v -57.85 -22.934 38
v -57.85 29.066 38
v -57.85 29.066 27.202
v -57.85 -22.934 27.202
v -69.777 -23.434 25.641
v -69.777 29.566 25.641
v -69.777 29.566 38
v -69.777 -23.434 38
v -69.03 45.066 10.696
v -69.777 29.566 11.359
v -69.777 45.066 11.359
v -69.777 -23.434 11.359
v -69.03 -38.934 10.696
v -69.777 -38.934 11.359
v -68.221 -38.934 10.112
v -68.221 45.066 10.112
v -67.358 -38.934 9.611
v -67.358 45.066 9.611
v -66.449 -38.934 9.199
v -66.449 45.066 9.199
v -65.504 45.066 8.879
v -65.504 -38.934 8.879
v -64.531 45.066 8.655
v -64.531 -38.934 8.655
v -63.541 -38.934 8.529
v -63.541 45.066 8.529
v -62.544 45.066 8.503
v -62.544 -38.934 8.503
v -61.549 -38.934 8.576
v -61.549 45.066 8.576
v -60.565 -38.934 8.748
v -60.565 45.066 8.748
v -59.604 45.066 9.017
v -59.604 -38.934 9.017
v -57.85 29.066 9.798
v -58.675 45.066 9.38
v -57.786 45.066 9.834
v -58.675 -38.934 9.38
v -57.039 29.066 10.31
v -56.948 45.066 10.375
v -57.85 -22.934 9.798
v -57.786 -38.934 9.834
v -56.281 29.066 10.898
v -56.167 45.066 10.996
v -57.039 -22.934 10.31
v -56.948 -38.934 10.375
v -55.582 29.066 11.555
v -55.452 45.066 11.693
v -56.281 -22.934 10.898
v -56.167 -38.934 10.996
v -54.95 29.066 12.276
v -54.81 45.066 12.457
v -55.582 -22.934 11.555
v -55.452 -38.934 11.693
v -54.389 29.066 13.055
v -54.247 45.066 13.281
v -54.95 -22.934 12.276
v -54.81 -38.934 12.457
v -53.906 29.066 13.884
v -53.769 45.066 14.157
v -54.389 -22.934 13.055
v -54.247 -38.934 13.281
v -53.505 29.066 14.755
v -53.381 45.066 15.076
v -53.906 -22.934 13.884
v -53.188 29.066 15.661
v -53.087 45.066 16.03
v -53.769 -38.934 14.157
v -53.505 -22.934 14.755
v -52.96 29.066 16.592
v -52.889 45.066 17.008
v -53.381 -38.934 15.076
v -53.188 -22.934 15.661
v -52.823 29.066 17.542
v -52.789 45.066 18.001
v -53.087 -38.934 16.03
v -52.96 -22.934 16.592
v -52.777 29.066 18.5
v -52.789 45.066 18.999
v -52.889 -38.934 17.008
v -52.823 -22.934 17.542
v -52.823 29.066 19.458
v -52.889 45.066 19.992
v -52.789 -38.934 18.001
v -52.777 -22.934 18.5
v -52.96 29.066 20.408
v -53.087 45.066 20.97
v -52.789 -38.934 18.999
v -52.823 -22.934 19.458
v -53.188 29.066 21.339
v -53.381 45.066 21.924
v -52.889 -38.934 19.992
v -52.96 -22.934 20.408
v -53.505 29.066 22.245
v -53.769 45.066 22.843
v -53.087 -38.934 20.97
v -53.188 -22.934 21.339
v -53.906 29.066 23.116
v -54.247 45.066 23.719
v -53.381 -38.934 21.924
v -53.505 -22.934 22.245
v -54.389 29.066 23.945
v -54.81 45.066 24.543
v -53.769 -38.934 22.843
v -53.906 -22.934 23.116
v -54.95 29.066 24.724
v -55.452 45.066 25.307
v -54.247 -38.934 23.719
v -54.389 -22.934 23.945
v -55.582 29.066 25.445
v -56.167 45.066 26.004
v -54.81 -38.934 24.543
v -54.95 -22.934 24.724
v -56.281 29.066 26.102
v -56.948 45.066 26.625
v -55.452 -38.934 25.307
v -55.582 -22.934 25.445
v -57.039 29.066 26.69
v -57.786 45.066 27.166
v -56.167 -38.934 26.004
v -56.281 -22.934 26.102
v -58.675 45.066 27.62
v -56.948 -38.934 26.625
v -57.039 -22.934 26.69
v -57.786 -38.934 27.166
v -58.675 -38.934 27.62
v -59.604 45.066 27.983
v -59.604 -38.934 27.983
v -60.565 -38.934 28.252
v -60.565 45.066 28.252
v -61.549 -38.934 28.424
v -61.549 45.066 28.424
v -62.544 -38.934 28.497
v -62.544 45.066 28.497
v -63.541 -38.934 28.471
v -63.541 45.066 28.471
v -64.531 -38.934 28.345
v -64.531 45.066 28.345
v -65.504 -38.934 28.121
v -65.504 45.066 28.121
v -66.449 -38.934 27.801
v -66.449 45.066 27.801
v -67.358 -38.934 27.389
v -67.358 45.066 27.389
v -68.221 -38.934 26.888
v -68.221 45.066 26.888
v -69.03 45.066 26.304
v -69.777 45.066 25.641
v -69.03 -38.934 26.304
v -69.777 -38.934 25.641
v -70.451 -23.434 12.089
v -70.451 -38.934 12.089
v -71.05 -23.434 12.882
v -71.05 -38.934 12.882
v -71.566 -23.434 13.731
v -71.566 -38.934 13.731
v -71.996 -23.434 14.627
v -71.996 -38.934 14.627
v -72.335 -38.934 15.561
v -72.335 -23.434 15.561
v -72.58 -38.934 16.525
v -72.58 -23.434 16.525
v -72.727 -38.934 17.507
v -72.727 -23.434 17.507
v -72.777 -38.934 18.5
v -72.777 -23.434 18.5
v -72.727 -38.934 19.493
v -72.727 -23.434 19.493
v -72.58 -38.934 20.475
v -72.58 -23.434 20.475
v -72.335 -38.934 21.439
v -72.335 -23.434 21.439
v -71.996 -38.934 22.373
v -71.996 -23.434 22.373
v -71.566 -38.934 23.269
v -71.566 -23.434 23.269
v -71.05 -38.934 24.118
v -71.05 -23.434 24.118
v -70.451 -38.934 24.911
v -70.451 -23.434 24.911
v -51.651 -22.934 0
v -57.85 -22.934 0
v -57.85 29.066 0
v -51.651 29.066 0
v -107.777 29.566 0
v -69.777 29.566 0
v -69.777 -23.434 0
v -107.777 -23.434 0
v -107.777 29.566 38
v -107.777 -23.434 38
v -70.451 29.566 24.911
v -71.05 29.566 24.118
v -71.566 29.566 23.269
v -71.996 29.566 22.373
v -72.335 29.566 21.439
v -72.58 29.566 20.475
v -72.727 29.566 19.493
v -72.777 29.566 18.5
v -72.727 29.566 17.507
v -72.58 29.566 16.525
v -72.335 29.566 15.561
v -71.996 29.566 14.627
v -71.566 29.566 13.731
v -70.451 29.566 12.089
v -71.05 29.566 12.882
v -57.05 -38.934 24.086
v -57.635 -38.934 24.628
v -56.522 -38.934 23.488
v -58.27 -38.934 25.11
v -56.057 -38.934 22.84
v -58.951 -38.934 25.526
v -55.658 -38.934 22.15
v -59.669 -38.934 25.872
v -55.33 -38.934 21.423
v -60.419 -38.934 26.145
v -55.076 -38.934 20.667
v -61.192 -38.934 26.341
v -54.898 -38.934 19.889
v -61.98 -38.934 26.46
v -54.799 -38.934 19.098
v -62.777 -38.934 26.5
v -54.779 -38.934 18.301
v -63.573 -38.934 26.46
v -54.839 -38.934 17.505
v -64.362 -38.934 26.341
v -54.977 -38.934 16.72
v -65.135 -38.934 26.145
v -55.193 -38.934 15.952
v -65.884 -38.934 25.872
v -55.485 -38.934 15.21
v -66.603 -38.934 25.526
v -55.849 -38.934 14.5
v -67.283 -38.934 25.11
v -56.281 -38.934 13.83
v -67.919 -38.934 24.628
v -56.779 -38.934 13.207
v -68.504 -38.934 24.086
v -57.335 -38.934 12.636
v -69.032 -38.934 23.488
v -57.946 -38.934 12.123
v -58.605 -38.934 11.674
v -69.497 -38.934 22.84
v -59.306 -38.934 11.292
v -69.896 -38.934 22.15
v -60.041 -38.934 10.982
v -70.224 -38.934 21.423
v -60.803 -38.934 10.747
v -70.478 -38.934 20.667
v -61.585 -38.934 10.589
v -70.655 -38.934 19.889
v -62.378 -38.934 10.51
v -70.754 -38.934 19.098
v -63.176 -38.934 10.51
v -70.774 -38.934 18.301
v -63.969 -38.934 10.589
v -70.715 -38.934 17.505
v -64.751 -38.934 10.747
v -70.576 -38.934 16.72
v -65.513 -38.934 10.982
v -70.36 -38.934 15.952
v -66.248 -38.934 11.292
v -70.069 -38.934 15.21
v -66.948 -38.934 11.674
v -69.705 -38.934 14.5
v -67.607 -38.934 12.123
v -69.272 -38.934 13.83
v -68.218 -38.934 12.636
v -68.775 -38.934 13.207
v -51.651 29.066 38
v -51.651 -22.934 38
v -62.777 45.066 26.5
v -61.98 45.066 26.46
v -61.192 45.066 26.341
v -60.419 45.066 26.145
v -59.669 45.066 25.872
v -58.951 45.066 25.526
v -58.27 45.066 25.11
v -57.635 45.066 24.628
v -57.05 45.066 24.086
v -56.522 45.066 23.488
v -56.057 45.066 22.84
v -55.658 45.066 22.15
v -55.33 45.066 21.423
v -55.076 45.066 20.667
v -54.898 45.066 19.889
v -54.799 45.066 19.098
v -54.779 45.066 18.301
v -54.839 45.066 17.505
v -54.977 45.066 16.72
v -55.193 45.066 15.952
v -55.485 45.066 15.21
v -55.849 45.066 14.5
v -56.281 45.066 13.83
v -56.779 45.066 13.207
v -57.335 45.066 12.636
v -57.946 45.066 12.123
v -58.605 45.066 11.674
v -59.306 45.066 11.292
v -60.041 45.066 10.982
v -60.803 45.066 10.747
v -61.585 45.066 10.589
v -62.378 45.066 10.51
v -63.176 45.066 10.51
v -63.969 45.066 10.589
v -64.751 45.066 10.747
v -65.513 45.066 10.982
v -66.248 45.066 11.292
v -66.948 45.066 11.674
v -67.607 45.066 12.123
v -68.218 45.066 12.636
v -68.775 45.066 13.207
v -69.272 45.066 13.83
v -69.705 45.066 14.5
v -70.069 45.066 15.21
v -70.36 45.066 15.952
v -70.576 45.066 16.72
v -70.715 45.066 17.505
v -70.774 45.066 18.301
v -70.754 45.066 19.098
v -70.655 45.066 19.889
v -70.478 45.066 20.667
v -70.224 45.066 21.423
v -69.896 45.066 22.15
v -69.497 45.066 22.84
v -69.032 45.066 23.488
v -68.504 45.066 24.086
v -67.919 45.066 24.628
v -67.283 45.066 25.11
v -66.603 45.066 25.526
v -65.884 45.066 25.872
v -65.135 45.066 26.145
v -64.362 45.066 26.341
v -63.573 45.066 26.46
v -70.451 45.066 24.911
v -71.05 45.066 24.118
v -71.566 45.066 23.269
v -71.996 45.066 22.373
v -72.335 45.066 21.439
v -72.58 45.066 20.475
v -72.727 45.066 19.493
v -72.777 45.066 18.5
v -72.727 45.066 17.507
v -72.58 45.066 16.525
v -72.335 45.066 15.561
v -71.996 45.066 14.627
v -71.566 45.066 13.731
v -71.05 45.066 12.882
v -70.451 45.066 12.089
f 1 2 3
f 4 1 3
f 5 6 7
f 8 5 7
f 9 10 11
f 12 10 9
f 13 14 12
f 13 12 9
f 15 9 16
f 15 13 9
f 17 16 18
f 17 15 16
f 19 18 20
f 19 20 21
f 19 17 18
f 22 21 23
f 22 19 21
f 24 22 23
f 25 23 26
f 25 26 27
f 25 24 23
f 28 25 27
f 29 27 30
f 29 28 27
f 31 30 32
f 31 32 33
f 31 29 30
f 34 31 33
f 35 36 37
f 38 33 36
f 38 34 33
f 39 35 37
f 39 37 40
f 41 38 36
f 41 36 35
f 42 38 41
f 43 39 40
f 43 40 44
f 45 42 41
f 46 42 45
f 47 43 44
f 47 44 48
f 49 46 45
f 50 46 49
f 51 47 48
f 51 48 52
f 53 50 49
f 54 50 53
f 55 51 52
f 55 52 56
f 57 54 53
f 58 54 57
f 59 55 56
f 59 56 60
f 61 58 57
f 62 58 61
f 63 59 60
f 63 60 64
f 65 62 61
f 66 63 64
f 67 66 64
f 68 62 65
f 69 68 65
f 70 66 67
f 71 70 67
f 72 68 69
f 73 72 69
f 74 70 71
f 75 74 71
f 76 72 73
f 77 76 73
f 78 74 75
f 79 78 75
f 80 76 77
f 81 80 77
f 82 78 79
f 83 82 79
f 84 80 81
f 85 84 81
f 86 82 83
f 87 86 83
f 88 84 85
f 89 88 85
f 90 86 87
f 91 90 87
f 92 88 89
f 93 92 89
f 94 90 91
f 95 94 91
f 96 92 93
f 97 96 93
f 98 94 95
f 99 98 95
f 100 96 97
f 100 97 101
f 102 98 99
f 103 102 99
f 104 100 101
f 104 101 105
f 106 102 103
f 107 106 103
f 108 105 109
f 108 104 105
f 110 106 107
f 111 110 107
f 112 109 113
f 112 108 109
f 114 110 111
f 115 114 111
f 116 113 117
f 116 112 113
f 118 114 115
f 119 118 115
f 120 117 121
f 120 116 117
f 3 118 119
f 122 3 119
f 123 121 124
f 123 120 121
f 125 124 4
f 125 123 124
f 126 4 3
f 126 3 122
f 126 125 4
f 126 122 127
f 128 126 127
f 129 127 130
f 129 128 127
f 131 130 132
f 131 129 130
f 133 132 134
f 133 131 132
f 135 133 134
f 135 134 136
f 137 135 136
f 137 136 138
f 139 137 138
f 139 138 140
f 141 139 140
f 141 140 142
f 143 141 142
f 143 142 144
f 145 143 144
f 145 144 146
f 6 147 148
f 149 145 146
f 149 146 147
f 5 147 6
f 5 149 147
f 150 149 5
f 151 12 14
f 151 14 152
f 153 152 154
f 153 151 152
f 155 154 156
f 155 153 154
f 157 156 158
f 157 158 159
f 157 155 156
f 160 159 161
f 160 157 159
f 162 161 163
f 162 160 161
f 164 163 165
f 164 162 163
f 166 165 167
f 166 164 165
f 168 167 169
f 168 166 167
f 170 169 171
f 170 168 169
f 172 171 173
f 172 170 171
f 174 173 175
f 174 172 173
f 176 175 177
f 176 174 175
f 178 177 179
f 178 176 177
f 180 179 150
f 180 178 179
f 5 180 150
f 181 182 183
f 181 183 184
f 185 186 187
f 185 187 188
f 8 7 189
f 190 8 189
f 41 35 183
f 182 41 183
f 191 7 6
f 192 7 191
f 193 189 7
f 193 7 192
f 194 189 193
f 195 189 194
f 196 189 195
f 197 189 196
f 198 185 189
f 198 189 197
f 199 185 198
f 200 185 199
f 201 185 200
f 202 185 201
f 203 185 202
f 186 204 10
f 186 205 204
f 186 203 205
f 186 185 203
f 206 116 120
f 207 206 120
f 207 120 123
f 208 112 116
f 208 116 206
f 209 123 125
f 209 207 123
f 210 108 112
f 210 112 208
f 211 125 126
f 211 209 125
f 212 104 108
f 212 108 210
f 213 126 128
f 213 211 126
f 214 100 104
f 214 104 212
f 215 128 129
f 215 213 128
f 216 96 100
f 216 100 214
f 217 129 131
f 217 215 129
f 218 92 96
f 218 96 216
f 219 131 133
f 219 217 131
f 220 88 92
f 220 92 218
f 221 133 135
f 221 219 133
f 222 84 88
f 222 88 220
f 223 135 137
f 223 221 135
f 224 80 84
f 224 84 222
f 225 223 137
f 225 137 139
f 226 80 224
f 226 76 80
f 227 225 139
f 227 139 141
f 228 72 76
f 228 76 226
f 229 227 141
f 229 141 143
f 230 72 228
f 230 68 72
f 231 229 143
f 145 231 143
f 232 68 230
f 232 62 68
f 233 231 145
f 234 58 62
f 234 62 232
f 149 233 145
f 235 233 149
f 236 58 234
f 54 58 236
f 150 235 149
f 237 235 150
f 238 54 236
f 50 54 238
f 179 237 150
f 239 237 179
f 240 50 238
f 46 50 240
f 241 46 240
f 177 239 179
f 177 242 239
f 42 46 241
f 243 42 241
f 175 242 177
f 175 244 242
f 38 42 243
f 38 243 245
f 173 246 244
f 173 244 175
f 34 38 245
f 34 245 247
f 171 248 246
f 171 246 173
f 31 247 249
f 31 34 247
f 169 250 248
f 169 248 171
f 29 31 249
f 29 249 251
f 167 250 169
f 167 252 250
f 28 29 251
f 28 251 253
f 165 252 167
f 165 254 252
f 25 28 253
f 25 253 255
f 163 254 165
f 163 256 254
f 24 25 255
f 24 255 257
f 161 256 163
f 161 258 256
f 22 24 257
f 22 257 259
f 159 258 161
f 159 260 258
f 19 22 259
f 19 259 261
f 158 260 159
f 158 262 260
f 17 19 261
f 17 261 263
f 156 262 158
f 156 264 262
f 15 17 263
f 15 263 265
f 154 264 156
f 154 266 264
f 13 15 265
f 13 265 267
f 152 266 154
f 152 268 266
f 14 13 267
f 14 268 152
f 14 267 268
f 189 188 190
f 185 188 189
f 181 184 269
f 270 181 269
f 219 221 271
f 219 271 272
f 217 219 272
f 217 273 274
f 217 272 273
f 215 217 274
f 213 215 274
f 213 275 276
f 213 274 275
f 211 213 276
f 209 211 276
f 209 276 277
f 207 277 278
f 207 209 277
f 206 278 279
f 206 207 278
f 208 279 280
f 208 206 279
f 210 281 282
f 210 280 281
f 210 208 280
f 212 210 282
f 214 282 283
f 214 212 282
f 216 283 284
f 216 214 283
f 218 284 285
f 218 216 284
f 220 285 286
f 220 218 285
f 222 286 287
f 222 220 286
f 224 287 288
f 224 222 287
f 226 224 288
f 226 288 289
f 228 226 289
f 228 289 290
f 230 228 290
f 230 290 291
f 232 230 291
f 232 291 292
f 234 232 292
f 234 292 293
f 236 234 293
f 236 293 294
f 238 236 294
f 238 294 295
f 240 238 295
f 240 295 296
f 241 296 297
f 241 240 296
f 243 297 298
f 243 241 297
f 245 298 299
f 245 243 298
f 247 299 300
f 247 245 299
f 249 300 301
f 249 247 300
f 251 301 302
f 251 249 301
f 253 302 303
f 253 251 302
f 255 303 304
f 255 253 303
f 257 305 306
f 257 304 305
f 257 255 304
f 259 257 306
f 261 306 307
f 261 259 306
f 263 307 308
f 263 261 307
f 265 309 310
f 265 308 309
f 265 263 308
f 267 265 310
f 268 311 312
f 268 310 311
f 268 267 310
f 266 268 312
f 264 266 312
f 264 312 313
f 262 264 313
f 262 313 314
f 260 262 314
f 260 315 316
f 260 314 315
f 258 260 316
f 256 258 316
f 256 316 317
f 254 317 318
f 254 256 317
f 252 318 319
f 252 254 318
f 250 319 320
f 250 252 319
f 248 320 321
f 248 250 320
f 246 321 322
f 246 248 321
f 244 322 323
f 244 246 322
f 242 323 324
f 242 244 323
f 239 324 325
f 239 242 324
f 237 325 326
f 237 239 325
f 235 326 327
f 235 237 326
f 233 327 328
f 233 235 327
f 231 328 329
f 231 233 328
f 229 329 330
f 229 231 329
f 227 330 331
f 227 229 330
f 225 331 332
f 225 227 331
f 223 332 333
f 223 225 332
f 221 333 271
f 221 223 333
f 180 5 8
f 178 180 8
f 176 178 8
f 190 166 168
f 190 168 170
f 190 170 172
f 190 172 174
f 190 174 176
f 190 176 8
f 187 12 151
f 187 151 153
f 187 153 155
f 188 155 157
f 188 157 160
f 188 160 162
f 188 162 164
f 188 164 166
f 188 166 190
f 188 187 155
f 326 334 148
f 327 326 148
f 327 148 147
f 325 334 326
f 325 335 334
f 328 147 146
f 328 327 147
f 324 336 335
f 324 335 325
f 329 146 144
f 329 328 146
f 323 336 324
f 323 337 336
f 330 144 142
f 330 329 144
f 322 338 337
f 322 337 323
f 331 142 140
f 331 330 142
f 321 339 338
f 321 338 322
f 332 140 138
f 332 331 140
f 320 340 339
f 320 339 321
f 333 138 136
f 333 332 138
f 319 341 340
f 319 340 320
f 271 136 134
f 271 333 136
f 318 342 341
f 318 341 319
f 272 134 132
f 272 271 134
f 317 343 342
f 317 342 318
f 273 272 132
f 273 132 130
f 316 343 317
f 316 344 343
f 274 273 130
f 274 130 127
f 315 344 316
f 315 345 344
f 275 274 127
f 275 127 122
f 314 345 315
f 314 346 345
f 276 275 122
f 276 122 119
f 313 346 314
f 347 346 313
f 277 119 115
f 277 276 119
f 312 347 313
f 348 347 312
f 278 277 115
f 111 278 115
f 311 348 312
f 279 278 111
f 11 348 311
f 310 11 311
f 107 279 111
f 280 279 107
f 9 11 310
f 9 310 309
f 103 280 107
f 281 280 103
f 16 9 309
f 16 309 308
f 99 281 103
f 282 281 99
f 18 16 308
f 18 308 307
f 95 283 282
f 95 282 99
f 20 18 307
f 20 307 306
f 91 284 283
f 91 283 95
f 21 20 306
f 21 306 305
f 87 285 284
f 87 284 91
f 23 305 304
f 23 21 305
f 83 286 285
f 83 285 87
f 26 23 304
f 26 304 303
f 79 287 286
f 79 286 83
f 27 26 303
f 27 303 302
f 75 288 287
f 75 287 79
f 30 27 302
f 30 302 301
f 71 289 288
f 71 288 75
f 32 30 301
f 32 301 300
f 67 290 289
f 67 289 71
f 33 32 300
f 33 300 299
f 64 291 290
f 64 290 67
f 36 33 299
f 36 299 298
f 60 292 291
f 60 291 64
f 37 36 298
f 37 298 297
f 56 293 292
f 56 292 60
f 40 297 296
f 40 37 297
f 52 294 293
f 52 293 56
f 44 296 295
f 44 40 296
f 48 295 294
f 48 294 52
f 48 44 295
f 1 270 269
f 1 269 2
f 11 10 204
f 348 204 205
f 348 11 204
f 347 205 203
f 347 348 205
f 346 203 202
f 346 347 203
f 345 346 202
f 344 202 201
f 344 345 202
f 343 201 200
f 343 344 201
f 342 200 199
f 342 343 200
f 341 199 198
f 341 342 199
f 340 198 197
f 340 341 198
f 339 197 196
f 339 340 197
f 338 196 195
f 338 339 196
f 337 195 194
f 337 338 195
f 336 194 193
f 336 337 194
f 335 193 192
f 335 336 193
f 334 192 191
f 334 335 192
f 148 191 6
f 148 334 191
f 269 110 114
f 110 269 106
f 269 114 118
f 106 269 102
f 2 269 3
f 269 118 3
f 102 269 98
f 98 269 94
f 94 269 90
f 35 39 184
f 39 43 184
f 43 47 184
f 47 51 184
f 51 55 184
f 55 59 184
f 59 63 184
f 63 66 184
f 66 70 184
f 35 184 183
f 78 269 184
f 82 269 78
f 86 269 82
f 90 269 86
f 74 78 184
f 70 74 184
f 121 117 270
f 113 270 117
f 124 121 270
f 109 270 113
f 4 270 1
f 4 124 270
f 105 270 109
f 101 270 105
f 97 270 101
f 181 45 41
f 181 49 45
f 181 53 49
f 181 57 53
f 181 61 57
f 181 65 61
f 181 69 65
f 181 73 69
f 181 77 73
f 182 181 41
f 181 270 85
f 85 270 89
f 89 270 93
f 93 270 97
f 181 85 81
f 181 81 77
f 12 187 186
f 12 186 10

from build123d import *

# Parameters (mm, degrees)
BOSS_EXTRUDE1_DEPTH     = 38
SKETCH3_R               = 10
BOSS_EXTRUDE4_DEPTH     = 84
CUT_EXTRUDE1_DEPTH      = 142.830361505
CUT_EXTRUDE1_DEPTH_BACK = 142.830361505
SKETCH4_R               = 8
CUT_EXTRUDE2_DEPTH      = 142.830361505
CUT_EXTRUDE2_DEPTH_BACK = 142.830361505
BOSS_EXTRUDE5_START     = -16
BOSS_EXTRUDE5_DEPTH     = 52


with BuildPart() as part:
    # Sketch2 → Boss-Extrude1 (new body)
    with BuildSketch(Plane.XY):
        Polygon((-107.776859504, 29.566115702), (-69.776859504, 29.566115702), (-69.776859504, 45.066115702), (-49.776859504, 45.066115702), (-49.776859504, -38.933884298), (-69.776859504, -38.933884298), (-69.776859504, -23.433884298), (-107.776859504, -23.433884298), align=None)
    extrude(amount=BOSS_EXTRUDE1_DEPTH)

    # Sketch3 → Boss-Extrude4 (add)
    with BuildSketch(Plane(origin=(0, 45.066115702, 0), x_dir=(1, 0, 0), z_dir=(0, 1, 0))):
        with Locations((-62.776859504, -18.5)):
            Circle(SKETCH3_R)
    extrude(amount=-BOSS_EXTRUDE4_DEPTH)

    # Sketch4 → Cut-Extrude1 (cut, two sides: drawn at the far end of the back side and taken through both)
    with BuildSketch(Plane(origin=(0, 45.066115702, 0), x_dir=(1, 0, 0), z_dir=(0, 1, 0)).offset(-CUT_EXTRUDE1_DEPTH_BACK)):
        with Locations(Location((-62.776859504, -18.5, 0), (0, 0, 270))):
            Circle(SKETCH4_R)
    extrude(amount=CUT_EXTRUDE1_DEPTH + CUT_EXTRUDE1_DEPTH_BACK, mode=Mode.SUBTRACT)

    # Sketch5 → Cut-Extrude2 (cut, two sides: drawn at the far end of the back side and taken through both)
    with BuildSketch(Plane(origin=(0, 45.066115702, 0), x_dir=(1, 0, 0), z_dir=(0, 1, 0)).offset(-CUT_EXTRUDE2_DEPTH_BACK)):
        with BuildLine():
            Line((-56.443650173, 0), (-69.776859504, 0))
            Line((-69.776859504, 0), (-69.776859504, -11.358571571))
            ThreePointArc((-69.776859504, -11.358571571), (-52.776859504, -18.5), (-69.776859504, -25.641428429))
            Line((-69.776859504, -25.641428429), (-69.776859504, -38))
            Line((-69.776859504, -38), (-56.443650173, -38))
            Line((-56.443650173, -38), (-49.776859504, -38))
            Line((-49.776859504, -38), (-49.776859504, 0))
            Line((-49.776859504, 0), (-56.443650173, 0))
        make_face()
    extrude(amount=CUT_EXTRUDE2_DEPTH + CUT_EXTRUDE2_DEPTH_BACK, mode=Mode.SUBTRACT)

    # Sketch6 → Boss-Extrude5 (add)
    with BuildSketch(Plane(origin=(0, 45.066115702, 0), x_dir=(1, 0, 0), z_dir=(0, 1, 0)).offset(BOSS_EXTRUDE5_START)):
        with BuildLine():
            Line((-57.850011392, 0), (-52.785705753, 0))
            Line((-52.785705753, 0), (-51.650992669, 0))
            Line((-51.650992669, 0), (-51.650992669, -38))
            Line((-51.650992669, -38), (-52.785705753, -38))
            Line((-52.785705753, -38), (-57.850011392, -38))
            Line((-57.850011392, -38), (-57.850011392, -24.802869797))
            ThreePointArc((-57.850011392, -24.802869797), (-54.776859504, -18.5), (-57.850011392, -12.197130203))
            Line((-57.850011392, -12.197130203), (-57.850011392, 0))
        make_face()
    extrude(amount=-BOSS_EXTRUDE5_DEPTH)


solid = part.part
